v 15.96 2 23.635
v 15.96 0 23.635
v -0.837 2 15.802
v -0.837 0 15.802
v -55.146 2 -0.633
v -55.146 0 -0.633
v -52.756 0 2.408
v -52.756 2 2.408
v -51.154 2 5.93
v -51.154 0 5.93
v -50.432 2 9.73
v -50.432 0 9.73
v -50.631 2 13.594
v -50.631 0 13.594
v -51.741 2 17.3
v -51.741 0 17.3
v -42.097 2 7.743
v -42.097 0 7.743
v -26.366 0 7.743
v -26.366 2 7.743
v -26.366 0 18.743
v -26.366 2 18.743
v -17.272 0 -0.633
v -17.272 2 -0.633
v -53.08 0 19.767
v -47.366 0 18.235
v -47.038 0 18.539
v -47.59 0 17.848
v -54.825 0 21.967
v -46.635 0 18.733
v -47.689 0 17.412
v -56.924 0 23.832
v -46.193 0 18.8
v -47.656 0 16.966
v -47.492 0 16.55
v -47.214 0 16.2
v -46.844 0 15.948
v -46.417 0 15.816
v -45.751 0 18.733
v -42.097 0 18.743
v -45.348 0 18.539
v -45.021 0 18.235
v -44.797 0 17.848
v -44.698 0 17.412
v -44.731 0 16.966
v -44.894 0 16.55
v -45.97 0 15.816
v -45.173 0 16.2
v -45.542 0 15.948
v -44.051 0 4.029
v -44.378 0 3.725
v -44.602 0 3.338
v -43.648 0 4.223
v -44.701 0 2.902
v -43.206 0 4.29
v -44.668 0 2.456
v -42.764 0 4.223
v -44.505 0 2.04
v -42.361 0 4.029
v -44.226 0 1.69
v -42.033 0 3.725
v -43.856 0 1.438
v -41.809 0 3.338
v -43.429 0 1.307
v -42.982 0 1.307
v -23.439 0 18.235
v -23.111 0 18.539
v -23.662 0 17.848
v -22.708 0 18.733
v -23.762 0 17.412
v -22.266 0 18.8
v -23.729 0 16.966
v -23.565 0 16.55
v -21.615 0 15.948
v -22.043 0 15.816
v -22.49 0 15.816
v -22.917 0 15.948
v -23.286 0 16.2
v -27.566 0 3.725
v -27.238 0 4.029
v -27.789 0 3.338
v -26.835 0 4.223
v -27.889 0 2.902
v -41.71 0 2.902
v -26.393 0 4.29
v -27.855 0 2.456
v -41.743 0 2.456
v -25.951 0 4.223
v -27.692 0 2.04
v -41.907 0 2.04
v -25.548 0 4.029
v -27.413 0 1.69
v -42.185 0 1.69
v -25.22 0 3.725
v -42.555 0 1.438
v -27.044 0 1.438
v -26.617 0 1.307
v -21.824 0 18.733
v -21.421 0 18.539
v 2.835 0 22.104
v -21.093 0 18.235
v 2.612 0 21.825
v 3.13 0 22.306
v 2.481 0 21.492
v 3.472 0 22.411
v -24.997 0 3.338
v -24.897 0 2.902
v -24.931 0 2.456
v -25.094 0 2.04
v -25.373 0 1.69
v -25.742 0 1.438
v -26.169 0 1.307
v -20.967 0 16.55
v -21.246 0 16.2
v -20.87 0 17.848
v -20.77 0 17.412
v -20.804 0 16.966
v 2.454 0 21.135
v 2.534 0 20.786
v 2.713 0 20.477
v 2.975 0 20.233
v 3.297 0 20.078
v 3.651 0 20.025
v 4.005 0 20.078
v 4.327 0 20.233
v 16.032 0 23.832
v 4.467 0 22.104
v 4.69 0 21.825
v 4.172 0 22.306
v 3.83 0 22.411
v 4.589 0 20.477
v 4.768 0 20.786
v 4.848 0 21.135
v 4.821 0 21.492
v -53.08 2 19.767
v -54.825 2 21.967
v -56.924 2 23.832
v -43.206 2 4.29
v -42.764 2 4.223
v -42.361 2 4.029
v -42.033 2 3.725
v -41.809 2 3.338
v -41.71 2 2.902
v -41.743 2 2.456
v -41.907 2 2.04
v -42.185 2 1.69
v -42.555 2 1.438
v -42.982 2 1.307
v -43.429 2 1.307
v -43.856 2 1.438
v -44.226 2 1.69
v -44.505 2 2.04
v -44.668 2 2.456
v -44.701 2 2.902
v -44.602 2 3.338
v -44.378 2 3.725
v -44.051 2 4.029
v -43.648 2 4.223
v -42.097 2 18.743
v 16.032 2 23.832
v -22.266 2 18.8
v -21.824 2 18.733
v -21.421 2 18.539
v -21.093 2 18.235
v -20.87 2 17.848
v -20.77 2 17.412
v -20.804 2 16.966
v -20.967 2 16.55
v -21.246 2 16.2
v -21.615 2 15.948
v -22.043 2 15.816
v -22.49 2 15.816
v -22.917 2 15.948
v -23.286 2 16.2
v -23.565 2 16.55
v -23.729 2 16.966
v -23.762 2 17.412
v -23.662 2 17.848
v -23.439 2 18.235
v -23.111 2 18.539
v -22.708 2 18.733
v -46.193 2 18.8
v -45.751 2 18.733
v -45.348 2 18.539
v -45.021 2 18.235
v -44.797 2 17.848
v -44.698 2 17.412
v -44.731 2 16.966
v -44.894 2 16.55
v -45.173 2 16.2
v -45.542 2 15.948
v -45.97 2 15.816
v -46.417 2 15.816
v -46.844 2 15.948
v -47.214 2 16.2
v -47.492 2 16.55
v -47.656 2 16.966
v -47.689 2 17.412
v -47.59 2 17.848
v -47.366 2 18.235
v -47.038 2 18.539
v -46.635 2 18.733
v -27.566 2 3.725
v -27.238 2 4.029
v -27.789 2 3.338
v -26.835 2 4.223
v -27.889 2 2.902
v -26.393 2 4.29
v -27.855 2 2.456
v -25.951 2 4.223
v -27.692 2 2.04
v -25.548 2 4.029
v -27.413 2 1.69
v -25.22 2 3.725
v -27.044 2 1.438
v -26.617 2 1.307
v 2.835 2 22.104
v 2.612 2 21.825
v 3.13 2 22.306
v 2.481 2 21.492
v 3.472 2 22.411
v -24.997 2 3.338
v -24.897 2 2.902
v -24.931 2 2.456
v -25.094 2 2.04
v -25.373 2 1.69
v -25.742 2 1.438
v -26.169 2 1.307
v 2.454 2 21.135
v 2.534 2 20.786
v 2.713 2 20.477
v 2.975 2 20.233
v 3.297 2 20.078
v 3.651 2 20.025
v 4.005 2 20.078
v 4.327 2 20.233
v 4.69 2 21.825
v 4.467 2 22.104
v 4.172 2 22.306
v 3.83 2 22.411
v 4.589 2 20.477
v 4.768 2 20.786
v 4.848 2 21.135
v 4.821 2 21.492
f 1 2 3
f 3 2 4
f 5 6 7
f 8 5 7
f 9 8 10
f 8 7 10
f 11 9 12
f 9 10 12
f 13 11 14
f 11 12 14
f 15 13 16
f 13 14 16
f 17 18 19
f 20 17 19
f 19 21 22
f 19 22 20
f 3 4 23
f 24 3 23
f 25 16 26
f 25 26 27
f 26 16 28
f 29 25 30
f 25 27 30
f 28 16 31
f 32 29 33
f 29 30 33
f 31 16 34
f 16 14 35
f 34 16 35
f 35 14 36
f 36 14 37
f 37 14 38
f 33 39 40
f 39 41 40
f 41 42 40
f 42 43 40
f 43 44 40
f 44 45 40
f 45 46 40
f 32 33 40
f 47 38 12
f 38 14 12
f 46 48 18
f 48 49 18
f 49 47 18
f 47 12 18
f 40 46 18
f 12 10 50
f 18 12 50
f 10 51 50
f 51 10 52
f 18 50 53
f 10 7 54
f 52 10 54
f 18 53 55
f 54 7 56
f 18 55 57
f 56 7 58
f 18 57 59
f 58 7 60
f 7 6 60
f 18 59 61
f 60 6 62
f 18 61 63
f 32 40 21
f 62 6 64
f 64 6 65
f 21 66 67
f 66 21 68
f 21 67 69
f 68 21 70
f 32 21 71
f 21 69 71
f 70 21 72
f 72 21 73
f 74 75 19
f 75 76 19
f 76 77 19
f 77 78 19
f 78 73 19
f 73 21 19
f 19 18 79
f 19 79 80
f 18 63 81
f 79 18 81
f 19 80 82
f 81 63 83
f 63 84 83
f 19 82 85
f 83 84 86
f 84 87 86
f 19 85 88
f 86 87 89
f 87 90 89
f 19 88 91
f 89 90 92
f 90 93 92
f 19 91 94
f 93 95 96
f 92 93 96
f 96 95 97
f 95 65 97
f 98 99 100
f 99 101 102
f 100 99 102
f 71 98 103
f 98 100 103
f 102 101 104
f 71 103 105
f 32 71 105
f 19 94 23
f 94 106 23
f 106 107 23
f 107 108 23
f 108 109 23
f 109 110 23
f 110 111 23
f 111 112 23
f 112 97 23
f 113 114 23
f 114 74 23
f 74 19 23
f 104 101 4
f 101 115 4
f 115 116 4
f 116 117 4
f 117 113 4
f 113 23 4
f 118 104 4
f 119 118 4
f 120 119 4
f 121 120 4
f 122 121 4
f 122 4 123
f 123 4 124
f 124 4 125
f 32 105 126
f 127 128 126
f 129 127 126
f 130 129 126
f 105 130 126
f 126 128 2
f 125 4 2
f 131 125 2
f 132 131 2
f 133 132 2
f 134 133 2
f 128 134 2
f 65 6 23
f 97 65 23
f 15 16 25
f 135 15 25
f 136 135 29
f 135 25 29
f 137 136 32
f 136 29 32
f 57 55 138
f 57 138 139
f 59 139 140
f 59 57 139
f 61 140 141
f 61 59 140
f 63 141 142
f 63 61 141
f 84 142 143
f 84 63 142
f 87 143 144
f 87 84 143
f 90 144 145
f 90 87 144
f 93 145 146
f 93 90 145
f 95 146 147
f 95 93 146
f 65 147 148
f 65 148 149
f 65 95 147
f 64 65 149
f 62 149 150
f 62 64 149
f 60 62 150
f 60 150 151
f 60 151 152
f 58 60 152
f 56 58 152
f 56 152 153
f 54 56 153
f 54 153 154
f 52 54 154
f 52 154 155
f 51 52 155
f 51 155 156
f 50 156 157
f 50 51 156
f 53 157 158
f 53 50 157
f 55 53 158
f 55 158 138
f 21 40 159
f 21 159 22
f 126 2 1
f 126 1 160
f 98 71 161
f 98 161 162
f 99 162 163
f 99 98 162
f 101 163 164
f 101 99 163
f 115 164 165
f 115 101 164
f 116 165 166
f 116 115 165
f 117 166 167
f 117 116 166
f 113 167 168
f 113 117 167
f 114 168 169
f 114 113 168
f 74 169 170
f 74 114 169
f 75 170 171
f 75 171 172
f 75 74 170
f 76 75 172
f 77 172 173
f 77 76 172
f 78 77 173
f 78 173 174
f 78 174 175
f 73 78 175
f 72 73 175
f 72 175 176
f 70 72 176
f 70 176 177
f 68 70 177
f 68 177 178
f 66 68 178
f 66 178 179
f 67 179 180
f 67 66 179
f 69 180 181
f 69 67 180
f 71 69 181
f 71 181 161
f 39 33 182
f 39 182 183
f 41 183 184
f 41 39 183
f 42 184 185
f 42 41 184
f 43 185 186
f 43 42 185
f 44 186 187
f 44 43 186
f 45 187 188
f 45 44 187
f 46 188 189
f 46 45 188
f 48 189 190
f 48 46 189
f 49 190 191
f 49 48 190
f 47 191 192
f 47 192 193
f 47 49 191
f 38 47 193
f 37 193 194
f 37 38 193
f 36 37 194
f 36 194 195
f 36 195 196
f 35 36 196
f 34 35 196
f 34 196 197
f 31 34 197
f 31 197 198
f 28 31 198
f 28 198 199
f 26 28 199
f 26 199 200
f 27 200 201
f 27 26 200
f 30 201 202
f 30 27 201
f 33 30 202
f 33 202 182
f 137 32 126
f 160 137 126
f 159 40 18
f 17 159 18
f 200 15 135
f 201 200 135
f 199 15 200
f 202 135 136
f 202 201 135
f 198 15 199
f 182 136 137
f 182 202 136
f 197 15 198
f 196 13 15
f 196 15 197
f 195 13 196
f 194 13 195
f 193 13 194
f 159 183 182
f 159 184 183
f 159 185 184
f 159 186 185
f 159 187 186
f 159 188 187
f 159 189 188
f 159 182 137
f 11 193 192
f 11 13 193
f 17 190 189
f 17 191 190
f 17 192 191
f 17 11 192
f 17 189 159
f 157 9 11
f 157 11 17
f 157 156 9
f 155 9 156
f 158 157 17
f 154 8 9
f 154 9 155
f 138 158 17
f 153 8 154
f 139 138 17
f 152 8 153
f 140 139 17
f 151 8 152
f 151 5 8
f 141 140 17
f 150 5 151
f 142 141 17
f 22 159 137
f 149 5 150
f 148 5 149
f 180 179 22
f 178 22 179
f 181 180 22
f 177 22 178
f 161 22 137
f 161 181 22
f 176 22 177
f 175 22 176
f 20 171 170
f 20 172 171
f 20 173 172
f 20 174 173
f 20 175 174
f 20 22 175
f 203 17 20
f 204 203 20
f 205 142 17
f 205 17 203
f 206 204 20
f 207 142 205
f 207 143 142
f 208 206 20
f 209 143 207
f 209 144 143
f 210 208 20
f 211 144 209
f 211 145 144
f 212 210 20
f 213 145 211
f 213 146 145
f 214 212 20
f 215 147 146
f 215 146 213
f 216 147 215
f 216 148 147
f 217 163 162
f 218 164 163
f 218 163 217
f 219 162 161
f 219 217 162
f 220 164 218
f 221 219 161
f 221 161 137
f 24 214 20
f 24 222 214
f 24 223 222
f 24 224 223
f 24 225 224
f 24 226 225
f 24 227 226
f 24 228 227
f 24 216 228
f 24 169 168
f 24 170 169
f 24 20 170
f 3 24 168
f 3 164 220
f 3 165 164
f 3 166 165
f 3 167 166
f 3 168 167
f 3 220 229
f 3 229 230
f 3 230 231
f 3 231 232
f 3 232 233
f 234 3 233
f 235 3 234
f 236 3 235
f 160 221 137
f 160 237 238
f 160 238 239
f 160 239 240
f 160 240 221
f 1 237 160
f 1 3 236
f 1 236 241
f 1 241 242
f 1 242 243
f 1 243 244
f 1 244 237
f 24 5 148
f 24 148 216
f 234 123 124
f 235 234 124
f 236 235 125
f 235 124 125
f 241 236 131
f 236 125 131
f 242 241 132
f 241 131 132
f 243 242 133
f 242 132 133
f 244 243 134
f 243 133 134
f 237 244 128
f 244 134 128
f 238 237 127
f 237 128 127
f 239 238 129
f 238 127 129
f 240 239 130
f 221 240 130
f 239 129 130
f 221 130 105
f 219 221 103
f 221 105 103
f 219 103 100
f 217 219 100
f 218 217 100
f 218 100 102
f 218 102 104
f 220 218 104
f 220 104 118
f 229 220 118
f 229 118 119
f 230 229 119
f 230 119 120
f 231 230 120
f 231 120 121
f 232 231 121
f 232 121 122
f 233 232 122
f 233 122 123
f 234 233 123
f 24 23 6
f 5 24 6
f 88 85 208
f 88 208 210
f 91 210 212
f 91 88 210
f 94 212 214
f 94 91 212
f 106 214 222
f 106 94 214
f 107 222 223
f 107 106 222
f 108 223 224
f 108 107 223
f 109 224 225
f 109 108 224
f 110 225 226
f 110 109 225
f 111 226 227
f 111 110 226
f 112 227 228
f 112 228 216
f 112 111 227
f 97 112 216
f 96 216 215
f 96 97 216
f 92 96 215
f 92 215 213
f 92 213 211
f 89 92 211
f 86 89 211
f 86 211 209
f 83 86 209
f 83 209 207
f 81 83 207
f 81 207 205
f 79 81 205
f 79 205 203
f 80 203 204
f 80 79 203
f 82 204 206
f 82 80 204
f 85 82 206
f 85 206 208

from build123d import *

# Parameters (mm, degrees)
SKETCH_1_R               = 1.5
SKETCH_1_W               = 15.730611704
SKETCH_1_H               = 11
EXTRUDE_1_DEPTH          = 2
CUT_EXTRUDE_1_DEPTH      = 106.5
CUT_EXTRUDE_1_DEPTH_BACK = 62.743635726
SKETCH_7_R               = 1.2
CUT_EXTRUDE_5_DEPTH      = 15


with BuildPart() as part:
    # Эскиз1 → Бобышка-Вытянуть1 (new body)
    with BuildSketch(Plane(origin=(0, 0, 0), x_dir=(1, 0, 0), z_dir=(0, 1, 0))):
        with BuildLine():
            Line((-56.923759365, -23.831956958), (16.382902061, -23.831956958))
            Line((16.382902061, -23.831956958), (-0.836945892, -15.802209985))
            Line((-0.836945892, -15.802209985), (-17.271974735, 0.632818857))
            Line((-17.271974735, 0.632818857), (-55.146365247, 0.632818857))
            ThreePointArc((-55.146365247, 0.632818857), (-50.679018006, -7.808361393), (-51.74094673, -17.29956905))
            ThreePointArc((-51.74094673, -17.29956905), (-53.905020217, -20.904809923), (-56.923759365, -23.831956958))
        make_face()
        with Locations((-43.205666325, -2.789799404)):
            Circle(SKETCH_1_R, mode=Mode.SUBTRACT)
        with Locations((-26.393046621, -2.789799404)):
            Circle(SKETCH_1_R, mode=Mode.SUBTRACT)
        with Locations((-46.193307824, -17.29956905)):
            Circle(SKETCH_1_R, mode=Mode.SUBTRACT)
        with Locations((-22.266173528, -17.29956905)):
            Circle(SKETCH_1_R, mode=Mode.SUBTRACT)
        with Locations((-34.23147938, -13.242579452)):
            Rectangle(SKETCH_1_W, SKETCH_1_H, mode=Mode.SUBTRACT)
    extrude(amount=EXTRUDE_1_DEPTH)

    # Эскиз2 → Вырез-Вытянуть1 (cut, two sides: drawn at the far end of the back side and taken through both)
    with BuildSketch(Plane(origin=(0, 2, 0), x_dir=(1, 0, 0), z_dir=(0, 1, 0)).offset(-CUT_EXTRUDE_1_DEPTH_BACK)):
        Polygon((16.382902061, -23.831956958), (15.960145161, -23.634822178), (16.059019052, -23.90647596), align=None)
    extrude(amount=CUT_EXTRUDE_1_DEPTH + CUT_EXTRUDE_1_DEPTH_BACK, mode=Mode.SUBTRACT)

    # Эскиз7 → Вырез-Вытянуть5 (cut)
    with BuildSketch(Plane.XZ):
        with Locations((3.651057562, 21.224691708)):
            Circle(SKETCH_7_R)
    extrude(amount=-CUT_EXTRUDE_5_DEPTH, mode=Mode.SUBTRACT)


solid = part.part
